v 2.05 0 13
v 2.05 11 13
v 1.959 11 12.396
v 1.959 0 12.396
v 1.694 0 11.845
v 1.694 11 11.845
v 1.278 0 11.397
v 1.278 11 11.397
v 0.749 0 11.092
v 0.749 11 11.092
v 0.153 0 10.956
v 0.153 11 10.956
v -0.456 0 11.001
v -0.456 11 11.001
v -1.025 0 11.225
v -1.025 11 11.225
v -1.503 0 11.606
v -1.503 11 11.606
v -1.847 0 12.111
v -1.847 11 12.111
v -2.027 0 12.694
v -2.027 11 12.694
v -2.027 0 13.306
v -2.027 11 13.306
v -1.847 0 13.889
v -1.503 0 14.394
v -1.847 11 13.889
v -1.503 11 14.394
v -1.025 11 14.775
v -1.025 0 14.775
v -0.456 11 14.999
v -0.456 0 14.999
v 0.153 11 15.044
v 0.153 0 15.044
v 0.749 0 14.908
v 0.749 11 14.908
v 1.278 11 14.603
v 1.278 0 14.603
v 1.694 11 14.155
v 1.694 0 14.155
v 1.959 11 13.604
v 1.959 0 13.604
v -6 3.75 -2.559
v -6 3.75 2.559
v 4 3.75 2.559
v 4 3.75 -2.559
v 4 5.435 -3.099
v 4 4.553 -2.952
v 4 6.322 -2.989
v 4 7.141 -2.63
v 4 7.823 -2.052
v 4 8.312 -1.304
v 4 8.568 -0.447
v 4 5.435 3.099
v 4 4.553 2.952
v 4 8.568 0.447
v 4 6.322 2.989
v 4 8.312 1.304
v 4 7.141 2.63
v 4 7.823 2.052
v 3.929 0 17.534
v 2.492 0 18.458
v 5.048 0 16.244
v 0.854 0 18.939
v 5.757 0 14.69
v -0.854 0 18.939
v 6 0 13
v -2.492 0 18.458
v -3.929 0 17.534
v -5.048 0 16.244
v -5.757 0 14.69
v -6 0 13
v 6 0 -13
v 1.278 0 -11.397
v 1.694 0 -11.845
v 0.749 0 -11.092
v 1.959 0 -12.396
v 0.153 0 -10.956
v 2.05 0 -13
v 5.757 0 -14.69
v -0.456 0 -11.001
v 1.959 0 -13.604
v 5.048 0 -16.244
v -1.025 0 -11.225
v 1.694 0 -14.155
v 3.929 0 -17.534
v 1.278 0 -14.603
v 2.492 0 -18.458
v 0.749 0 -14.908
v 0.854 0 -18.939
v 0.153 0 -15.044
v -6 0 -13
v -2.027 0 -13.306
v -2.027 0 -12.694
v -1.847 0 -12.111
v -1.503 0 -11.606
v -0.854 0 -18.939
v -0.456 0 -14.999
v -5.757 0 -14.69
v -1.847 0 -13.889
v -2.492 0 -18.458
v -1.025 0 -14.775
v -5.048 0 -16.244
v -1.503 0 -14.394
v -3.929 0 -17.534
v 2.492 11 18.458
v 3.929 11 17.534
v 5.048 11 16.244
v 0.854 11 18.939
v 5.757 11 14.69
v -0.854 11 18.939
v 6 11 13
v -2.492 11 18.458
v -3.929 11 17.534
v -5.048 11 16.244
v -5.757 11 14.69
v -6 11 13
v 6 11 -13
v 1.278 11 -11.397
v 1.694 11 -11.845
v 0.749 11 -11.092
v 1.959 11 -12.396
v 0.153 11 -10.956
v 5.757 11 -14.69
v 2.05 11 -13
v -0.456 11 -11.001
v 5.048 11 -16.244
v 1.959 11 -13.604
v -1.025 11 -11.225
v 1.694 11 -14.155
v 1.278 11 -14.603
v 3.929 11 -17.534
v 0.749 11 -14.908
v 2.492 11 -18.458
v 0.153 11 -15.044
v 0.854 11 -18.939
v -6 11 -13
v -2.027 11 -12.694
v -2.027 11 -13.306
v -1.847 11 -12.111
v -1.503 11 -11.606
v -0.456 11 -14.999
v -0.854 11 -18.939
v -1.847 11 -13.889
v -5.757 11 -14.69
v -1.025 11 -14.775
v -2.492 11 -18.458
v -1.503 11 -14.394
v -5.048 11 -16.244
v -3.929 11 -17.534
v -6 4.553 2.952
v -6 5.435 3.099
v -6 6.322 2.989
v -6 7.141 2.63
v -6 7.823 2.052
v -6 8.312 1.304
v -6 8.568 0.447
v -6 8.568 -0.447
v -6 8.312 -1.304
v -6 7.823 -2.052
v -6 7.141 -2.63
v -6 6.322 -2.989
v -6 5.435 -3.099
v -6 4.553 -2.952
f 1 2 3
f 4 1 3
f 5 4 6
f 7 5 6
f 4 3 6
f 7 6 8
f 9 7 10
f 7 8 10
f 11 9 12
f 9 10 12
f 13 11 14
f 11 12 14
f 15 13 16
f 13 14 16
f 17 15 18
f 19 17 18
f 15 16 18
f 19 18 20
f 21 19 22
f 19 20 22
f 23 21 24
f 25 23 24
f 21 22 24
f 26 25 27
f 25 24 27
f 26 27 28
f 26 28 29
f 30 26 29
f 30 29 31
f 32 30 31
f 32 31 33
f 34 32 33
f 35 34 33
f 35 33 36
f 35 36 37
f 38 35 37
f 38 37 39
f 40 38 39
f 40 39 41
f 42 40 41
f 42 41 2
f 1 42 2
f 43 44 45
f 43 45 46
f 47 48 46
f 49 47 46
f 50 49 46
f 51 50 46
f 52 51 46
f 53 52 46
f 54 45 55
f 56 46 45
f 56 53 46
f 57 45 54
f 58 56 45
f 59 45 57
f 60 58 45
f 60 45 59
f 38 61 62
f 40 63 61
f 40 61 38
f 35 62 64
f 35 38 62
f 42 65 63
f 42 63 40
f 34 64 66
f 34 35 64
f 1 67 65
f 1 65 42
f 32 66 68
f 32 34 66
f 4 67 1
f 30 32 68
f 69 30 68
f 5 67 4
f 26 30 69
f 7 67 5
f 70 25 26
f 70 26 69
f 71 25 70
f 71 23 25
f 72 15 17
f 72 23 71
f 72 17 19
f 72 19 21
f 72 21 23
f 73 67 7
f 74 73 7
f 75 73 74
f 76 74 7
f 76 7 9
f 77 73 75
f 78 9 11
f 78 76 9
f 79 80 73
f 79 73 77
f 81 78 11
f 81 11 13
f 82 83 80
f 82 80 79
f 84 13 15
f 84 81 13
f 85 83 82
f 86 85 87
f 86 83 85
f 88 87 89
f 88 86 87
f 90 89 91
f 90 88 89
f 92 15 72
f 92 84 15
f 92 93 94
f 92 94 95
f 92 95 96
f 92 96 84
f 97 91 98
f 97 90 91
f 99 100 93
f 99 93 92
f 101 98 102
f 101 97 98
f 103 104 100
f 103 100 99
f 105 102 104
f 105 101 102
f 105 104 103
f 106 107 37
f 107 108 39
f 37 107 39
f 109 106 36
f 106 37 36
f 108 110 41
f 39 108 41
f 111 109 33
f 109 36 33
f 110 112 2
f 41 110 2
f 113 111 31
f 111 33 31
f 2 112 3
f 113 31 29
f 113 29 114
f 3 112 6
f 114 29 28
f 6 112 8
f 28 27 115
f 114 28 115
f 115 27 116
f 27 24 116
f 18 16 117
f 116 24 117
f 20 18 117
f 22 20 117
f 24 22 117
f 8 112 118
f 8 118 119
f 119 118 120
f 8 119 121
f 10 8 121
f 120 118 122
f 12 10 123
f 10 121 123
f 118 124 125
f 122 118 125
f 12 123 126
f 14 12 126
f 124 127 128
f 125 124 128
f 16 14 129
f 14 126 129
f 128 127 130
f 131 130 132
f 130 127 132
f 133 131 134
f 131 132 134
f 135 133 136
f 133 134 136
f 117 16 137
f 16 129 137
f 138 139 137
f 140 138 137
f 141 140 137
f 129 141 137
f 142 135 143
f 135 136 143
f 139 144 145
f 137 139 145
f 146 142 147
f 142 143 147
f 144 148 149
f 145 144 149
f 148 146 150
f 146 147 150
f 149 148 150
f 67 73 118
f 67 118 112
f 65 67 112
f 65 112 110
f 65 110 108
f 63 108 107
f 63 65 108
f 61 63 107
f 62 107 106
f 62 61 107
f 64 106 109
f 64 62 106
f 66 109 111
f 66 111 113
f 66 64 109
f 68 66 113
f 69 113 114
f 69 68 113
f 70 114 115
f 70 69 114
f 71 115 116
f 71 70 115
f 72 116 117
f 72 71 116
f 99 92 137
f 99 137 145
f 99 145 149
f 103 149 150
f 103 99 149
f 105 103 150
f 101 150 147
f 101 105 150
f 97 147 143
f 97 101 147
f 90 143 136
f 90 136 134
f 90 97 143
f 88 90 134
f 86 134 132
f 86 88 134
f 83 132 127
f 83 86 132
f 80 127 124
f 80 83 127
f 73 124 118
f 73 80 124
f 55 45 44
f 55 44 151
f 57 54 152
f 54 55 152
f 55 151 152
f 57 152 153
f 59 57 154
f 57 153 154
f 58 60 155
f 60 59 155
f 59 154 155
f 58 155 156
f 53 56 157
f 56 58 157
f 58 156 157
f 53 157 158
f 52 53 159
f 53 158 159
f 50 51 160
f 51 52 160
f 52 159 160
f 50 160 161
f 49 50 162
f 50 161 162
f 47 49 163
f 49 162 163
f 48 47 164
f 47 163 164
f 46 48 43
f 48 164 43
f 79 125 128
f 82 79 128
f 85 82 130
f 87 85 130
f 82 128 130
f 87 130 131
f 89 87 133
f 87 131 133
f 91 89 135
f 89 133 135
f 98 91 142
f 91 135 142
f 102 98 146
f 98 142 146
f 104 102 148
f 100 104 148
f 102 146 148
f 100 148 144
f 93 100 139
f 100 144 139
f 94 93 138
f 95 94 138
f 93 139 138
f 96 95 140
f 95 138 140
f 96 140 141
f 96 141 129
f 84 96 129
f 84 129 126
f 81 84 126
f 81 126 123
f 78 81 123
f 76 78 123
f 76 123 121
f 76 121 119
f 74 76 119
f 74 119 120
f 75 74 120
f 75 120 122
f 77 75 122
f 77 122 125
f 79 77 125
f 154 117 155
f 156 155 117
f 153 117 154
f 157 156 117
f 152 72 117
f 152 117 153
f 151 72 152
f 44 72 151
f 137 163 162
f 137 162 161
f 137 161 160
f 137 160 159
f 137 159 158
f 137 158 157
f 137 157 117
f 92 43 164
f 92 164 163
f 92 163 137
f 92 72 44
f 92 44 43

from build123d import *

# Parameters (mm, degrees)
EXTRUDE_1_DEPTH     = 11
SKETCH_2_R          = 2.05
CUT_EXTRUDE_1_DEPTH = 12
SKETCH_3_R          = 3.1
CUT_EXTRUDE_2_DEPTH = 10
EXTRUDE_3_DEPTH     = 10


with BuildPart() as part:
    # 草图1 → 凸台-拉伸1 (new body)
    with BuildSketch(Plane(origin=(0, 0, 0), x_dir=(1, 0, 0), z_dir=(0, 1, 0))):
        with BuildLine():
            Line((-6, -13), (-6, 13))
            ThreePointArc((-6, 13), (0, 19), (6, 13))
            Line((6, 13), (6, -13))
            ThreePointArc((6, -13), (0, -19), (-6, -13))
        make_face()
    extrude(amount=EXTRUDE_1_DEPTH)

    # 草图2 → 切除-拉伸1 (cut, through all)
    with BuildSketch(Plane(origin=(0, 11, 0), x_dir=(1, 0, 0), z_dir=(0, 1, 0))):
        with Locations((0, 13)):
            Circle(SKETCH_2_R)
        with Locations((0, -13)):
            Circle(SKETCH_2_R)
    extrude(amount=-CUT_EXTRUDE_1_DEPTH, mode=Mode.SUBTRACT)

    # 草图3 → 切除-拉伸2 (cut)
    with BuildSketch(Plane.ZY.offset(6)):
        with Locations((0, 5.5)):
            Circle(SKETCH_3_R)
    extrude(amount=-CUT_EXTRUDE_2_DEPTH, mode=Mode.SUBTRACT)

    # 草图4 → 凸台-拉伸3 (add)
    with BuildSketch(Plane.ZY.offset(6)):
        with BuildLine():
            Line((3.146029243, 3.75), (-3.146029243, 3.75))
            ThreePointArc((-3.146029243, 3.75), (0, 1.9), (3.146029243, 3.75))
        make_face()
    extrude(amount=-EXTRUDE_3_DEPTH)


solid = part.part
